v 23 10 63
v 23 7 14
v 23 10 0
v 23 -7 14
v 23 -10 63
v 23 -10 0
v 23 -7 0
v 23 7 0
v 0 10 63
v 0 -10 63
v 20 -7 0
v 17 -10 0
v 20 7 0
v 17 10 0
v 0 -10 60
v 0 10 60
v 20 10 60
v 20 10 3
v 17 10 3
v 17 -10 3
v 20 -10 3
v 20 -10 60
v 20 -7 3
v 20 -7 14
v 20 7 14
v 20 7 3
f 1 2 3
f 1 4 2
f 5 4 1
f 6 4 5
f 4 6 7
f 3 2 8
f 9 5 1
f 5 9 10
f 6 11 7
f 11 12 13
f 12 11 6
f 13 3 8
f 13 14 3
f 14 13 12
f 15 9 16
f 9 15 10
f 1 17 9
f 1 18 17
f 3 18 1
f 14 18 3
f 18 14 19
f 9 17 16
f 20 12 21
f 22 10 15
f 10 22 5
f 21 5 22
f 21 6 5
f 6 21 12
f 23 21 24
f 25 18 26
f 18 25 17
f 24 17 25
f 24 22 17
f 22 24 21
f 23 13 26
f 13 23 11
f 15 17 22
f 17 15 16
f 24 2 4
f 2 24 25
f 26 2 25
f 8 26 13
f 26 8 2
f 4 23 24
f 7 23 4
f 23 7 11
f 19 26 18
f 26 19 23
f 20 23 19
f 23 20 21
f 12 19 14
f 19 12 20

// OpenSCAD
hook = 20;
arm = 60;
width = 20;
thin = 3;
hole = width - thin*2;

translate([(hook+thin)/2, 0, (arm+thin)/2])
{
    difference()
    {
        cube([hook+thin, width, arm+thin], true);
        translate([-thin/2, 0, -thin/2])
        {
            cube([hook, width, arm], true);
        }
        translate([0, 0, -(arm+thin-hole)/2])
        {
        cube([hook+thin, hole, hole], true);
        }
    }
    translate([(hook)/2-thin, 0, -arm/2])
    {
        cube([thin, width, thin], true);
    }
}
